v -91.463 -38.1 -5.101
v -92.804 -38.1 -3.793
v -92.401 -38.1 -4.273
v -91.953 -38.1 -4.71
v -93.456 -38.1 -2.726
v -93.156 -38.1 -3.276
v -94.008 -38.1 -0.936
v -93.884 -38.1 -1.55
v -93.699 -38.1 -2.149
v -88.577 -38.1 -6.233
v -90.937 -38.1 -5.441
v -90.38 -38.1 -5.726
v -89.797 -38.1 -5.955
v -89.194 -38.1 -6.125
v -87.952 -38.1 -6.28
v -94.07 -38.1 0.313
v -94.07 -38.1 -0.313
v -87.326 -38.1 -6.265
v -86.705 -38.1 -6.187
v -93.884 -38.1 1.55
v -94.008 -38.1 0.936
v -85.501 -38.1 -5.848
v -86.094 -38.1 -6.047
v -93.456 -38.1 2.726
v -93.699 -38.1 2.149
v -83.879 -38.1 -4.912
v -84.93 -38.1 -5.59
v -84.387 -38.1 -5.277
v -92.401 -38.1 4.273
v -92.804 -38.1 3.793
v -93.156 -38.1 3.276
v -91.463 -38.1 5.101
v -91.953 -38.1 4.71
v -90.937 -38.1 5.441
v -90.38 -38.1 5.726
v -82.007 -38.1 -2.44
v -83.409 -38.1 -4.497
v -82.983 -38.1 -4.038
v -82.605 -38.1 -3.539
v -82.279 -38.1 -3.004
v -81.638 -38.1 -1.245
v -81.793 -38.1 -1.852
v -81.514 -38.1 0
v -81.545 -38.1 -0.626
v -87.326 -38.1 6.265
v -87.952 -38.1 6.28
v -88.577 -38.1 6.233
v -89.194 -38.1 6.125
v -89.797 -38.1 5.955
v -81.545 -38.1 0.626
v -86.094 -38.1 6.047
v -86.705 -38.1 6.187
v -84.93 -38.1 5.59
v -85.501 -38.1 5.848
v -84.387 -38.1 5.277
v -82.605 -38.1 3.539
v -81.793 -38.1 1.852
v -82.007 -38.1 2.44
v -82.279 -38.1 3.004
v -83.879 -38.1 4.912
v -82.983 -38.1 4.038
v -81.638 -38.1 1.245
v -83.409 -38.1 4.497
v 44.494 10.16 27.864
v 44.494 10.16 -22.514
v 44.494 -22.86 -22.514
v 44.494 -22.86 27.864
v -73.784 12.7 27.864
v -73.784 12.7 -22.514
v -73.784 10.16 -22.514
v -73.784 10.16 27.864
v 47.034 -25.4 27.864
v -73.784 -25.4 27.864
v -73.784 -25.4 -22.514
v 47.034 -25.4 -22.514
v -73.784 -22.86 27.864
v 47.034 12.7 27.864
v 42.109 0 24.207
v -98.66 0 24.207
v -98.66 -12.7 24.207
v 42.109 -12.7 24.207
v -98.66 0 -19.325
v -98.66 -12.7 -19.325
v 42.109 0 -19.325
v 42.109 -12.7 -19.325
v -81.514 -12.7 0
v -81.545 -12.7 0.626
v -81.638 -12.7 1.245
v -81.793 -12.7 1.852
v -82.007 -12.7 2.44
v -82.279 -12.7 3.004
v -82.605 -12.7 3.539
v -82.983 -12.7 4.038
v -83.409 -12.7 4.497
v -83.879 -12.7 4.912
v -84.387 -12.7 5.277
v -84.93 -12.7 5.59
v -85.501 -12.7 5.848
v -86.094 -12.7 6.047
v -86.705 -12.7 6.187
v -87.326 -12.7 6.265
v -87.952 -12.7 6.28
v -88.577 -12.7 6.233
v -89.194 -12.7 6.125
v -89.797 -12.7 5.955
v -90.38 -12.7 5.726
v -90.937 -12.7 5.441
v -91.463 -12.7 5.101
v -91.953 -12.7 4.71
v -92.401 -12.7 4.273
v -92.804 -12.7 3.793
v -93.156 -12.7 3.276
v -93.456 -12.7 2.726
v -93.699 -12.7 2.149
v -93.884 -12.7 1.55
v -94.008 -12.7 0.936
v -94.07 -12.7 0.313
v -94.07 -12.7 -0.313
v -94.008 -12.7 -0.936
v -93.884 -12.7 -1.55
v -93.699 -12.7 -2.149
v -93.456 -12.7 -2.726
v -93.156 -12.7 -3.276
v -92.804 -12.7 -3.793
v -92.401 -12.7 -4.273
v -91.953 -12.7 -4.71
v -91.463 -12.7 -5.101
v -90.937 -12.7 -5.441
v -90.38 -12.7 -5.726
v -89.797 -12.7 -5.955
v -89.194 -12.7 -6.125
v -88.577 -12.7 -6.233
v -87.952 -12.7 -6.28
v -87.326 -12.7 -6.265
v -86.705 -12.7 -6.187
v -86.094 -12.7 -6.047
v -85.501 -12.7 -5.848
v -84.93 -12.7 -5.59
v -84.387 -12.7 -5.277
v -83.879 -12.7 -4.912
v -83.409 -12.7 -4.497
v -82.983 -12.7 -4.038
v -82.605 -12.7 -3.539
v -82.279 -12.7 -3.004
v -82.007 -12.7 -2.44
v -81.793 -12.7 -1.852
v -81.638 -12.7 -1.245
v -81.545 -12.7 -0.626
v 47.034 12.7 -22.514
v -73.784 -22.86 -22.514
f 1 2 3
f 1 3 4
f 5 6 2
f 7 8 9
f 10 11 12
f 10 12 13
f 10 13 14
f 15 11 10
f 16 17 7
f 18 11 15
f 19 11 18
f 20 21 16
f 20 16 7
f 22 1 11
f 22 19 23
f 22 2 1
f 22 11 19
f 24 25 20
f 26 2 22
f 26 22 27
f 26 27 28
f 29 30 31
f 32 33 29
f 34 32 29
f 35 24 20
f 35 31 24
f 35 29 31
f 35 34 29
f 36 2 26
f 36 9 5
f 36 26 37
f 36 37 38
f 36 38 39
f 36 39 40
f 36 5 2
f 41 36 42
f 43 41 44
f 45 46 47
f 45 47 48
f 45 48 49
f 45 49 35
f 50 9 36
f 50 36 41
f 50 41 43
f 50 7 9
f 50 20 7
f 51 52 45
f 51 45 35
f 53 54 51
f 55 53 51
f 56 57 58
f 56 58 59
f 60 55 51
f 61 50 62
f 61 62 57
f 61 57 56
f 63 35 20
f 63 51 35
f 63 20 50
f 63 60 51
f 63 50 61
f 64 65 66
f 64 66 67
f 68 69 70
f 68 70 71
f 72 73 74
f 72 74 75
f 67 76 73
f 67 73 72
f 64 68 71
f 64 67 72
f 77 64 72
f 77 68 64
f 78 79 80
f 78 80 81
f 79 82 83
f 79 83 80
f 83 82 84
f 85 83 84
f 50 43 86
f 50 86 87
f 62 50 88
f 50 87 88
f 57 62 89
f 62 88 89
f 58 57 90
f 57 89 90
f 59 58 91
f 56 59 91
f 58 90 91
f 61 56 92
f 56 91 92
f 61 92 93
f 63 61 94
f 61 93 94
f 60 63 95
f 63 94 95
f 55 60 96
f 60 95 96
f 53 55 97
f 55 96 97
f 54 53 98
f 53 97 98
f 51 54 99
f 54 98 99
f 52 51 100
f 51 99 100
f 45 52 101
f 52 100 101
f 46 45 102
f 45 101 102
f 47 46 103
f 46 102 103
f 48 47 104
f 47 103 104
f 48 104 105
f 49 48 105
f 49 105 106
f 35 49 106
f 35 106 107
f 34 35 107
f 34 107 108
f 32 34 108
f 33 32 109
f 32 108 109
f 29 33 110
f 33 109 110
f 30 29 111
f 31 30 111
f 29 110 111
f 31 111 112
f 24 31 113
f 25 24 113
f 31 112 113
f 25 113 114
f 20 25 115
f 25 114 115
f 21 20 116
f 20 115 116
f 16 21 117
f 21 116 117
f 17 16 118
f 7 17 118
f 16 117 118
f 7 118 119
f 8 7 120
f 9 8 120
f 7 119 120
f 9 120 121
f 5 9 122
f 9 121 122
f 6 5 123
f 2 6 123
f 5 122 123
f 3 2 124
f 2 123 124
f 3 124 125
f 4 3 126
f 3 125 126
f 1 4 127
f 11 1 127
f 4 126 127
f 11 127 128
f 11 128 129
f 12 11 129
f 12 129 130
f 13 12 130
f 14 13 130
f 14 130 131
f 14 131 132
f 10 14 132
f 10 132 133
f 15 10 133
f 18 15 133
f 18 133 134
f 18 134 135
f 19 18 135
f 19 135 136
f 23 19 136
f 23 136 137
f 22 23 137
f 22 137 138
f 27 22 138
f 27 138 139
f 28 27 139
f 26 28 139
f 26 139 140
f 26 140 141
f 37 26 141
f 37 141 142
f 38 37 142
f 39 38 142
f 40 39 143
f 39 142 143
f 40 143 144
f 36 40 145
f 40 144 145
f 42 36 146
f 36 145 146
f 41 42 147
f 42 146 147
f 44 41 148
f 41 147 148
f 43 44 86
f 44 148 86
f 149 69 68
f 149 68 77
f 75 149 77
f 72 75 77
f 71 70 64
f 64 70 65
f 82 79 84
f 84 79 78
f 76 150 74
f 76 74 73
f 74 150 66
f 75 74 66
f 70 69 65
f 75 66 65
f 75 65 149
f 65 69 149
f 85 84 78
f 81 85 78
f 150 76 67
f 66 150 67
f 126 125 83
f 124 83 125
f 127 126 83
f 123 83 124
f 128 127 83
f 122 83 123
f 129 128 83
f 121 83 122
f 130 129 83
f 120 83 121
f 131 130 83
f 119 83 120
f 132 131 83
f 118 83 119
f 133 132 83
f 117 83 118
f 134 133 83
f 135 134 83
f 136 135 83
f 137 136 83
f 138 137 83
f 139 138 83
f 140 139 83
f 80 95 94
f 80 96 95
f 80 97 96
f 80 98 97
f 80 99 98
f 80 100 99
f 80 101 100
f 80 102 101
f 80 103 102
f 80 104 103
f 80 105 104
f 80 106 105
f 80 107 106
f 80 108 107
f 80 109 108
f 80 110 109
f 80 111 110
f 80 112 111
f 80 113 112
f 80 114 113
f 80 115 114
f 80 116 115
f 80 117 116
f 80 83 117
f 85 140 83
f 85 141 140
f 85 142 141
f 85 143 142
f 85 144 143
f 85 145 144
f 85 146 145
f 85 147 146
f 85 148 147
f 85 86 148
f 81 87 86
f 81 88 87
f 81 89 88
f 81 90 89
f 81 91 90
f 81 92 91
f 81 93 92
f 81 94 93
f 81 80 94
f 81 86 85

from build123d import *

# Parameters (mm, degrees)
F0_W      = 120.817792
F0_H      = 50.377894
F1_DEPTH  = 25.4
F1_FACE_W = 120.817792
F1_FACE_H = 50.377894
F2_DEPTH  = 12.7
F3_T      = -2.54
F4_W      = 140.768982
F4_H      = 43.532602
F5_DEPTH  = 12.7
F6_R      = 6.282201
F7_DEPTH  = 25.4


with BuildPart() as f1:
    # F0 (on Front) → F1 (new body)
    with BuildSketch(Plane.XZ):
        with Locations((-13.374658, 2.674932)):
            Rectangle(F0_W, F0_H)
    extrude(amount=F1_DEPTH)

    # F1_face (on face) → F2 (join, symmetric)
    with BuildSketch(Plane(origin=(-13.374658, 0, 2.674932), x_dir=(1, 0, 0), z_dir=(0, 1, 0))):
        Rectangle(F1_FACE_W, F1_FACE_H)
    extrude(amount=F2_DEPTH, both=True)

    # F3
    f3_openings = [f1.faces().sort_by_distance(p)[0] for p in [
        (-13.374658, -6.35, 27.863879),
        (-73.783554, -6.35, 2.674932),
        (-13.374658, -6.35, -22.514015),
    ]]
    offset(amount=F3_T, openings=f3_openings)


with BuildPart() as f5:
    # F4 (on Front) → F5 (new body)
    with BuildSketch(Plane.XZ):
        with Locations((-28.275851, 2.441084)):
            Rectangle(F4_W, F4_H)
    extrude(amount=F5_DEPTH)

    # F6 (on face) → F7 (join)
    with BuildSketch(Plane.XZ.offset(12.7)):
        with Locations((-87.795772, 0)):
            Circle(F6_R)
    extrude(amount=F7_DEPTH)


solid = Compound([f1.part, f5.part])
